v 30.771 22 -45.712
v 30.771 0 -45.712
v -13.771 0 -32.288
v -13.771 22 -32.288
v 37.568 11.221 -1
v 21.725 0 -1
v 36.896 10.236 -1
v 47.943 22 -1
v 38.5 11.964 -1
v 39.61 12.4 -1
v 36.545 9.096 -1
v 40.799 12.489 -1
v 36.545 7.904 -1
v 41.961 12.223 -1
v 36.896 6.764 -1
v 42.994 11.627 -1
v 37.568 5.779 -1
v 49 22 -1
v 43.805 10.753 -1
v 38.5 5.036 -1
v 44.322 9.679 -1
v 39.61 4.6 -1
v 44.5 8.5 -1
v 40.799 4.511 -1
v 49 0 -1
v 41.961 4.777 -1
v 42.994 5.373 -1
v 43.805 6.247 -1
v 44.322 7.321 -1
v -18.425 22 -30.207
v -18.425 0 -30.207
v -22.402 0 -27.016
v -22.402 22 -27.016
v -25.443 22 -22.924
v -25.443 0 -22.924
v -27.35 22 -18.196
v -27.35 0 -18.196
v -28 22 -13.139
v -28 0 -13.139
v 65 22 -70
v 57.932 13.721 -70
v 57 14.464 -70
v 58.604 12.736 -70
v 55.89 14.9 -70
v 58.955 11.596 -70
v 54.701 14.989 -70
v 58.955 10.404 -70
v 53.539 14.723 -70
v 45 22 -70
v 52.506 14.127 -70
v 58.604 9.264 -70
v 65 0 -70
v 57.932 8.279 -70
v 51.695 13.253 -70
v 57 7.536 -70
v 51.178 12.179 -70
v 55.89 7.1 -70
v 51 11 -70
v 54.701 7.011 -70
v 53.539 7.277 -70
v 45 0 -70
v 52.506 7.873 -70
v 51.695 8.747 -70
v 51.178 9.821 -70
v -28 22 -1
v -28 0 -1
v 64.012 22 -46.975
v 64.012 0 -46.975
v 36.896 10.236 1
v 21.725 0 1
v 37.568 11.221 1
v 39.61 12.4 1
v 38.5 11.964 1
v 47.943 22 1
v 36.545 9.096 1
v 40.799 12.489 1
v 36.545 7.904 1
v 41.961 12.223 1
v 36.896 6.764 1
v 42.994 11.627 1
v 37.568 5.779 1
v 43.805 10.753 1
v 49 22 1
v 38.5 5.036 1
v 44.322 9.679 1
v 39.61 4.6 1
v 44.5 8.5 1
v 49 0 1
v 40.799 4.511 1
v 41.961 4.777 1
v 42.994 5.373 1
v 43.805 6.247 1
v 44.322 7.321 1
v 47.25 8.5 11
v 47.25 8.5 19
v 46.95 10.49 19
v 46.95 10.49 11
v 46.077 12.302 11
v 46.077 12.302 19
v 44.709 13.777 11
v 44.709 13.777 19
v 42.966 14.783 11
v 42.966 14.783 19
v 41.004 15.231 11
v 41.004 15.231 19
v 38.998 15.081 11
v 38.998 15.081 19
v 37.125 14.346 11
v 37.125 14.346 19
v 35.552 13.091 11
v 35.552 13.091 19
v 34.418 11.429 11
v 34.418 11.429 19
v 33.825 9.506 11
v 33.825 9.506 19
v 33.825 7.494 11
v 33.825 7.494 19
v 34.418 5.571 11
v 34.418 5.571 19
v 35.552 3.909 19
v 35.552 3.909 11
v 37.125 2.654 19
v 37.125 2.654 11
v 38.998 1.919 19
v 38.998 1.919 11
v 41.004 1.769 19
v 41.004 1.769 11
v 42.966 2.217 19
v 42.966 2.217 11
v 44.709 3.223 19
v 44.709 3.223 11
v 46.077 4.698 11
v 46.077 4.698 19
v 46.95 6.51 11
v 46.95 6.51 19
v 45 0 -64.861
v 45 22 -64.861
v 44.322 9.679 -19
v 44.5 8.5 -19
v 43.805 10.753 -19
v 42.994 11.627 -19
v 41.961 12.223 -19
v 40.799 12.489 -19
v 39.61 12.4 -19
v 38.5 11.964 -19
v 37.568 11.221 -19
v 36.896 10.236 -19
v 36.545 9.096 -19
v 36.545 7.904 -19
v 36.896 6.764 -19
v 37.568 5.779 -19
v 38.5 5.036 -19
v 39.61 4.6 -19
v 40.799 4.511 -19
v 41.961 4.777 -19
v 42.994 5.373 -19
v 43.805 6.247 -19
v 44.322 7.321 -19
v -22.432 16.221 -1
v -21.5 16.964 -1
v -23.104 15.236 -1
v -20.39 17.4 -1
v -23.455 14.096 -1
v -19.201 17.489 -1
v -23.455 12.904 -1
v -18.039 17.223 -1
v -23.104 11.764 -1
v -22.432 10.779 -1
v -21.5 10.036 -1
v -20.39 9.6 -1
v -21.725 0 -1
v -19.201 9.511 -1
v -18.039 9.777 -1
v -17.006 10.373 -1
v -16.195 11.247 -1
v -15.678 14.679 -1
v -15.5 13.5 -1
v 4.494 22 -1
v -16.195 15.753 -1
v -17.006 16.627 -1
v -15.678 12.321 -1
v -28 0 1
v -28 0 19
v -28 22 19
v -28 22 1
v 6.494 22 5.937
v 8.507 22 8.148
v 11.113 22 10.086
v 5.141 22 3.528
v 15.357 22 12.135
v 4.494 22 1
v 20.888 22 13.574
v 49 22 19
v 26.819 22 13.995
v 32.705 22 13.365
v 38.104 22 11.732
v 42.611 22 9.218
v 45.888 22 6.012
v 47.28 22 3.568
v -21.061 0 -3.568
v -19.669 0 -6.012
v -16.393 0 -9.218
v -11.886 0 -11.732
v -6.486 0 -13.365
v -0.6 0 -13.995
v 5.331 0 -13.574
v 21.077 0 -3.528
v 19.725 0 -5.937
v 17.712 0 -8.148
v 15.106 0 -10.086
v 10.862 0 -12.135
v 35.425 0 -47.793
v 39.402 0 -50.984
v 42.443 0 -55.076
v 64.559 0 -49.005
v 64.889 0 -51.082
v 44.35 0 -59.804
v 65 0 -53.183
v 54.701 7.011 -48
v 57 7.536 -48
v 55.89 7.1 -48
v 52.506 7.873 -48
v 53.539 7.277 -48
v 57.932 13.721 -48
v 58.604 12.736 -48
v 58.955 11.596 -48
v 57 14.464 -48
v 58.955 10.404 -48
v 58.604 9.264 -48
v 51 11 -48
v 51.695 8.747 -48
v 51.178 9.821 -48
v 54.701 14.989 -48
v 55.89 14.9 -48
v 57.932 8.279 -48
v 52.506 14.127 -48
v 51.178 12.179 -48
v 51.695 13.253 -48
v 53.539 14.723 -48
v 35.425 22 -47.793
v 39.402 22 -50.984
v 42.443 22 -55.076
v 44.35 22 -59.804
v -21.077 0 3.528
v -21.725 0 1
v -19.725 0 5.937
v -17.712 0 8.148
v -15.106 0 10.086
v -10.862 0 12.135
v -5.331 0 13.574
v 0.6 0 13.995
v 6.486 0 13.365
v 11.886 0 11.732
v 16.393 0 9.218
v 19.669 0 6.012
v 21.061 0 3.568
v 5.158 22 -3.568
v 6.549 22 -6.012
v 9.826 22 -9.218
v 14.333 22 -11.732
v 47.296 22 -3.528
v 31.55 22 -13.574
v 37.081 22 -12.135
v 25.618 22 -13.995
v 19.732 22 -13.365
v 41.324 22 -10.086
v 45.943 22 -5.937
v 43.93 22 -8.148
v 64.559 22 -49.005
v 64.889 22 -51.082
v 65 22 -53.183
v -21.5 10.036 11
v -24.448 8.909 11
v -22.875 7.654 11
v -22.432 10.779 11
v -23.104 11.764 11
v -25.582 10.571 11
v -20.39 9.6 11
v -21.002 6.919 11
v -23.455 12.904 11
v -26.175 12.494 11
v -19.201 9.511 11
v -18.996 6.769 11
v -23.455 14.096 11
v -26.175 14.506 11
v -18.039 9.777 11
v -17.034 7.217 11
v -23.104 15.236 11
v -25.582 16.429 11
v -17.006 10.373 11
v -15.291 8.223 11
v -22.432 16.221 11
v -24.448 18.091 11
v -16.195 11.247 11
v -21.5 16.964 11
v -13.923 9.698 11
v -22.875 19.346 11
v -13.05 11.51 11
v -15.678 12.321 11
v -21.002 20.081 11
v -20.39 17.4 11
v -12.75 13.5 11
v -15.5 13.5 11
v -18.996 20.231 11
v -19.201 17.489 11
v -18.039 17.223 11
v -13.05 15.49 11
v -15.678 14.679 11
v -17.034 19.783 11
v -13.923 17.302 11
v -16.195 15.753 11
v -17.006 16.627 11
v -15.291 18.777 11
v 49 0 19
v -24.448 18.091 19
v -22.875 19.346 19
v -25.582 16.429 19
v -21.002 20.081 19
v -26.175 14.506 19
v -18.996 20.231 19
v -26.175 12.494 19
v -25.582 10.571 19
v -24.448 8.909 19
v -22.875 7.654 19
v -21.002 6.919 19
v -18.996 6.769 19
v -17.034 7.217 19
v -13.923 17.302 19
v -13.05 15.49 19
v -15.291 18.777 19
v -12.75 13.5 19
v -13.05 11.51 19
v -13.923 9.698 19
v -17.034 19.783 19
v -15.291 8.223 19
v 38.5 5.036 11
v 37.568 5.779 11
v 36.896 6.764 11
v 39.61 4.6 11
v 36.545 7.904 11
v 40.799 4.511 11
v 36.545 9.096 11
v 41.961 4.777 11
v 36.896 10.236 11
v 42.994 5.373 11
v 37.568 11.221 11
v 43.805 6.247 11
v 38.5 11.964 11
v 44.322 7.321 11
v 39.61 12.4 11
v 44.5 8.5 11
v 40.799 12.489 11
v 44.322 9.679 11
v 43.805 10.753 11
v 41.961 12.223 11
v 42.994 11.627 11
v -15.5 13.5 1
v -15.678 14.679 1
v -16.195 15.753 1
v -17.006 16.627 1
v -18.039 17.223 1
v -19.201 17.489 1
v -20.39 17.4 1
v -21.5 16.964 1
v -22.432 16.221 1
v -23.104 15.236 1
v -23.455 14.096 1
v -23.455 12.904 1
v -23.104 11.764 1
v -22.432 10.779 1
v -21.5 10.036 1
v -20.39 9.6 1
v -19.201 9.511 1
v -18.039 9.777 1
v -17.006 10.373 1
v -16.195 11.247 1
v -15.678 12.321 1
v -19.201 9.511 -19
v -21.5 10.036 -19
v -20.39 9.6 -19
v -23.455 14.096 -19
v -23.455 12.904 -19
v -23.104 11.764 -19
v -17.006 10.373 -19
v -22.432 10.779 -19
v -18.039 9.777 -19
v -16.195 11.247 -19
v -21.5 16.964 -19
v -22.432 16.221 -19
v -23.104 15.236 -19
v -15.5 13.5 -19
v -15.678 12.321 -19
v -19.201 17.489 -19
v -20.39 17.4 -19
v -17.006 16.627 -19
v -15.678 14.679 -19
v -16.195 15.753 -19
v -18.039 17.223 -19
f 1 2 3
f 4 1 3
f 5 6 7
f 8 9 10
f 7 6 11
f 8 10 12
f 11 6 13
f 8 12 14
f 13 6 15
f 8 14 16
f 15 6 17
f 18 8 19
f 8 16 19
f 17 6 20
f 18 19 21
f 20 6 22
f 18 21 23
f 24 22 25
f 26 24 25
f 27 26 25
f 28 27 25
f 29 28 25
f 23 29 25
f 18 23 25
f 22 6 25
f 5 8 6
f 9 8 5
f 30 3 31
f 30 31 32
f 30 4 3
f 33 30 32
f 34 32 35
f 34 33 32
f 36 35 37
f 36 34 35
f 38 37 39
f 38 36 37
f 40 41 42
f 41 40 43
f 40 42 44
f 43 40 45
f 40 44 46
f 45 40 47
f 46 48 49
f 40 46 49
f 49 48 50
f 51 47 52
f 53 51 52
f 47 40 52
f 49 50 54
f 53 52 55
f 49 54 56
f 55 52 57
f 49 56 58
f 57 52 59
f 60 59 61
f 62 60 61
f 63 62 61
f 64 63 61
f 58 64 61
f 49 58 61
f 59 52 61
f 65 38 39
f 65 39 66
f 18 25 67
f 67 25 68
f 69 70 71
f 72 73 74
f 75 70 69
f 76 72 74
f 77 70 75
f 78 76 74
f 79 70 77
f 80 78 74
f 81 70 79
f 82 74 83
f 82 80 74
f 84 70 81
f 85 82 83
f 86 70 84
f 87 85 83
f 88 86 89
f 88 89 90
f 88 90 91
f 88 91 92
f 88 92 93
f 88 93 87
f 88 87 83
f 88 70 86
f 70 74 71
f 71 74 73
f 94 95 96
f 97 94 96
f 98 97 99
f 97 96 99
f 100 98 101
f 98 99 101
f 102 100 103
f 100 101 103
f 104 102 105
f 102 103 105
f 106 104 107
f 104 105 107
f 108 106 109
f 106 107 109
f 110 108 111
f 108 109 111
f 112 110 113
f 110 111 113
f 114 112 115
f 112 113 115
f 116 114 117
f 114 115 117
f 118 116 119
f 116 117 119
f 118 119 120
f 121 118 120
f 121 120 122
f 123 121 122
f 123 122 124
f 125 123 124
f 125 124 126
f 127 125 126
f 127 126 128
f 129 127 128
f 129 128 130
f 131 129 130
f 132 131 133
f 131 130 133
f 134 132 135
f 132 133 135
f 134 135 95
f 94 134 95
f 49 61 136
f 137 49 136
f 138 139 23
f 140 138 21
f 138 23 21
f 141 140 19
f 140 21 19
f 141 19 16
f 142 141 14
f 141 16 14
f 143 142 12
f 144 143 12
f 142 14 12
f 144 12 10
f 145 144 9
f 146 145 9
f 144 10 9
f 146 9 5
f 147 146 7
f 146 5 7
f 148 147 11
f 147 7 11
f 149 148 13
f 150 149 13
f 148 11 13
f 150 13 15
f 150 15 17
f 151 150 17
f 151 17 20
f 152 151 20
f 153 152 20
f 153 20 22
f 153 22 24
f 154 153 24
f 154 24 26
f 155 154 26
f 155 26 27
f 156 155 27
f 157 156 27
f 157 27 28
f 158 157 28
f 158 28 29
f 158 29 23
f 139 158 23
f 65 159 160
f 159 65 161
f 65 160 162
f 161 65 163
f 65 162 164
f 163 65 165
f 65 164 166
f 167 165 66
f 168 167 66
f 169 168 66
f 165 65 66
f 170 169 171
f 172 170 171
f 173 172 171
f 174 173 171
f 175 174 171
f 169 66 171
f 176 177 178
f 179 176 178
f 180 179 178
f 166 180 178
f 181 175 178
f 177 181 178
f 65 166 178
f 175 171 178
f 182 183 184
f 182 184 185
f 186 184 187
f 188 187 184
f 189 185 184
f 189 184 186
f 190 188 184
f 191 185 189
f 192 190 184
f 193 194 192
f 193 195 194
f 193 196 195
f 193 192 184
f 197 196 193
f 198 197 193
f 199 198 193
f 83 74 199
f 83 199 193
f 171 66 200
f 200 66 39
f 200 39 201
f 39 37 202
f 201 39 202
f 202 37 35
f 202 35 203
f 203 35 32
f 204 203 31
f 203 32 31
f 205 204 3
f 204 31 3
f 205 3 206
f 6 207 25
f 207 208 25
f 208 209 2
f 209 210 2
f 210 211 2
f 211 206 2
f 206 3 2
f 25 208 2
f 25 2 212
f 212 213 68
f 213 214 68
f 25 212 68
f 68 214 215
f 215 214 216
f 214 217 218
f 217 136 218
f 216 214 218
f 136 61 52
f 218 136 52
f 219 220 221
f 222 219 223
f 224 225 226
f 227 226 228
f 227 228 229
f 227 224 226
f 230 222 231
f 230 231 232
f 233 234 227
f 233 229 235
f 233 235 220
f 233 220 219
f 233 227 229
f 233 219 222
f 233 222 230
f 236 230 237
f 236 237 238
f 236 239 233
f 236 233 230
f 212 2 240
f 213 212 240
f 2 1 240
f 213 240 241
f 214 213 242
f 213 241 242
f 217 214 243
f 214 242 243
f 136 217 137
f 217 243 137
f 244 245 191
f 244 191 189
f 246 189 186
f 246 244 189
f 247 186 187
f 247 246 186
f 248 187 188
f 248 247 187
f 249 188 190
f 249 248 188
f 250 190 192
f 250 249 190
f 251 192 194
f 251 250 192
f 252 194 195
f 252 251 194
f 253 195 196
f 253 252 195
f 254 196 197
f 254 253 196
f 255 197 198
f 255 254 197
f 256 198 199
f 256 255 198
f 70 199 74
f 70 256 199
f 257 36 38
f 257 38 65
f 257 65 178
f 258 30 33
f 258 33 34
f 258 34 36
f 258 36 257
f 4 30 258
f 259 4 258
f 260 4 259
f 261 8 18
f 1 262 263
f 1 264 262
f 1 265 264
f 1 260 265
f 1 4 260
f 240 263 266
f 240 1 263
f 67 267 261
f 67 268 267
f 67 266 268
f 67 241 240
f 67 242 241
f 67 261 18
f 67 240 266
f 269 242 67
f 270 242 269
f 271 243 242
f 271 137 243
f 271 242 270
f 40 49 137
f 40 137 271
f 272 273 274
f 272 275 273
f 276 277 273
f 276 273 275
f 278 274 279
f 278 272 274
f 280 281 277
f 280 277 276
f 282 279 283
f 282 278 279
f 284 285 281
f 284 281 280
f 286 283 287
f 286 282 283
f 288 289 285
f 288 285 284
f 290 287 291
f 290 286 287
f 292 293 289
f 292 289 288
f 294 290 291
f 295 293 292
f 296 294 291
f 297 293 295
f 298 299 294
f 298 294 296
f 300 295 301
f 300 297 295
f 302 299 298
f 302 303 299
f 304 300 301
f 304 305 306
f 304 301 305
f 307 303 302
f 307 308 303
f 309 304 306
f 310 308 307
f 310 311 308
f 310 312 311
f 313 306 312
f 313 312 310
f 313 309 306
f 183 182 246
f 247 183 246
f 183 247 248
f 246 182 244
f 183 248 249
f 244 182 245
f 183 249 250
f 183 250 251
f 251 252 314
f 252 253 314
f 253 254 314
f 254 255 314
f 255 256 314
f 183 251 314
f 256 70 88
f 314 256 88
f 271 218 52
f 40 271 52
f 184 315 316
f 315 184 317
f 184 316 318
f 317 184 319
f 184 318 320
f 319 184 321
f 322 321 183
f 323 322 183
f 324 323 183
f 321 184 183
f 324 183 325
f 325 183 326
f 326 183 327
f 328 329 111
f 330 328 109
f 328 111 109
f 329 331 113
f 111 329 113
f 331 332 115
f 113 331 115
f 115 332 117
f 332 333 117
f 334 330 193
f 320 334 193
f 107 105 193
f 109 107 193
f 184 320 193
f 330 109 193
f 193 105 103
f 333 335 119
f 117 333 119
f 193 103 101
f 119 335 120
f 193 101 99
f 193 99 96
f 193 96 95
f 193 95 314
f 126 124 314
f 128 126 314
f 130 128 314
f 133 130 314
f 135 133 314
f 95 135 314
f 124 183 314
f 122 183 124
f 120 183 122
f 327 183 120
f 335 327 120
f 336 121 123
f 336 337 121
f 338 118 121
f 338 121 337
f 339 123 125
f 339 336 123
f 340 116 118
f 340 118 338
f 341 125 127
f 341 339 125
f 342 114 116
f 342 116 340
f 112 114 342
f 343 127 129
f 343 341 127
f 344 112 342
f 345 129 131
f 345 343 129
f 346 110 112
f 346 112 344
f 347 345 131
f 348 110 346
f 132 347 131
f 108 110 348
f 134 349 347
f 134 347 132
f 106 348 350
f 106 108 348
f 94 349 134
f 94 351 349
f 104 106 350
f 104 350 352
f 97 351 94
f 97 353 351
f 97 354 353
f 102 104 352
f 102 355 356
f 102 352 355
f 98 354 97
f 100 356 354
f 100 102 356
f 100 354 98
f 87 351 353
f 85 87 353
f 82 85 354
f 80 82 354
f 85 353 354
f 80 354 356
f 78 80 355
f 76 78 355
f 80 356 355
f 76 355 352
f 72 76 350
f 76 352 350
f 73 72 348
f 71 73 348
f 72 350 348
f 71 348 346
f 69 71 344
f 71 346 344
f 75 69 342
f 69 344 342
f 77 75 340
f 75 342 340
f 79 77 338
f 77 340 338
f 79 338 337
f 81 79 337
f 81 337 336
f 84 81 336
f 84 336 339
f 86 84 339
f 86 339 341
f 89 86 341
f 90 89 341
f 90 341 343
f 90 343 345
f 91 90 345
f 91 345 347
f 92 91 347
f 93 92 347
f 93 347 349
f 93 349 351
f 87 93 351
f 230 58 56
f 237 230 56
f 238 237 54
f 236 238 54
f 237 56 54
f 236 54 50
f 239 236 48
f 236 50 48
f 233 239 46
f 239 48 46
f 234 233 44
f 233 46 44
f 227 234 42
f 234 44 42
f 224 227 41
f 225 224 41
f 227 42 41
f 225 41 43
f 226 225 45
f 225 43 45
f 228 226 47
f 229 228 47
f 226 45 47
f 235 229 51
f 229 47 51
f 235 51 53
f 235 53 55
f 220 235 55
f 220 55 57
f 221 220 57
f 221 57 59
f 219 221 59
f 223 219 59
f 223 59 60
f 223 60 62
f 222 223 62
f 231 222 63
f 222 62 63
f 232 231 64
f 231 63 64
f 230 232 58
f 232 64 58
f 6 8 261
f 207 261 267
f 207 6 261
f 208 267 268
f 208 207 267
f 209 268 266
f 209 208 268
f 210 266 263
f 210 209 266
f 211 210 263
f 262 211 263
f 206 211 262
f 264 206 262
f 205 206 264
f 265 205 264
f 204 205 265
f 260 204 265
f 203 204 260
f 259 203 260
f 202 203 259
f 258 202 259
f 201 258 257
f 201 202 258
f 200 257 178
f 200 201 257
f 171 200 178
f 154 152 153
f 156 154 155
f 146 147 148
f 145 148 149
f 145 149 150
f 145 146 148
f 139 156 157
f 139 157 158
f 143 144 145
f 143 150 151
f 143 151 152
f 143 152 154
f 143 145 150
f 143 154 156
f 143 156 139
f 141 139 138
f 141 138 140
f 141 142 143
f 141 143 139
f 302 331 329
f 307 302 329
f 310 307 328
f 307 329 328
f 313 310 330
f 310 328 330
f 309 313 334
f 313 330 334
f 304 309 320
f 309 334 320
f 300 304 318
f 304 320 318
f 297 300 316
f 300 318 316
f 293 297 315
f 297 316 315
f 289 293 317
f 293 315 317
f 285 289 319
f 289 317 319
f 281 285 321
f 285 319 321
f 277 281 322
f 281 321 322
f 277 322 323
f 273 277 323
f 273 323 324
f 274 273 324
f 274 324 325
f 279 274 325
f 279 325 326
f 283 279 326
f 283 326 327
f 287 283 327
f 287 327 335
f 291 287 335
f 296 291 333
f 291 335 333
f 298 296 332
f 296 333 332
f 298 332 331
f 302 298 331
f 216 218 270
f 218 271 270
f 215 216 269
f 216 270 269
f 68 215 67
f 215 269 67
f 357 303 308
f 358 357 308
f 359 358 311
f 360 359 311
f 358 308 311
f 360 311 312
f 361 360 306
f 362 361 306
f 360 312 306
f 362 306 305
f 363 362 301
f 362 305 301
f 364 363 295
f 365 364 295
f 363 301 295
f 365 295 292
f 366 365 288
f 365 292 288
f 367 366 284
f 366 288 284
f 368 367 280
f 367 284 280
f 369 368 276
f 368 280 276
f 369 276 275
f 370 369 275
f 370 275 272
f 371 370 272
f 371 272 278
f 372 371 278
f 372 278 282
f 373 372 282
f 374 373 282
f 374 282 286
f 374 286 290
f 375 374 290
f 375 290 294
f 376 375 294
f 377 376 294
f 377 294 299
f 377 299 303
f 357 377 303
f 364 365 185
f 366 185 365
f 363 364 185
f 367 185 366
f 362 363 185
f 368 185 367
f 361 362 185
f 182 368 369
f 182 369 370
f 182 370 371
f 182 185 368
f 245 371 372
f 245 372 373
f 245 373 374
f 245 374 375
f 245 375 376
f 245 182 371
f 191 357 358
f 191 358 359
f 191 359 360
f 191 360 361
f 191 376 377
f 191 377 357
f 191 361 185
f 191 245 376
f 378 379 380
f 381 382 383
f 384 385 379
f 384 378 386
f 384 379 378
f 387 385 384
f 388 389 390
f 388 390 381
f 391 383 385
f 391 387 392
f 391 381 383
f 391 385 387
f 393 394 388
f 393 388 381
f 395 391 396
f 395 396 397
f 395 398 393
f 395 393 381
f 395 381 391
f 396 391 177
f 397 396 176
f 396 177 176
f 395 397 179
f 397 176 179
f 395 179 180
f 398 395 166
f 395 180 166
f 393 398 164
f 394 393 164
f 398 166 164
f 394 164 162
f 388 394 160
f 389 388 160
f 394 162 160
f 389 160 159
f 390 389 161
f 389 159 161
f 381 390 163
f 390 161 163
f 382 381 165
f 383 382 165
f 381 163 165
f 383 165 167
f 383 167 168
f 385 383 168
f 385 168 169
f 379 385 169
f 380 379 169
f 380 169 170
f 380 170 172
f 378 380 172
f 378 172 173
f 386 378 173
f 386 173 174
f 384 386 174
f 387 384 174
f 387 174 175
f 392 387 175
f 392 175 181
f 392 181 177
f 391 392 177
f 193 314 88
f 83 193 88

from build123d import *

# Parameters (mm, degrees)
BOSS_EXTRU_1_DEPTH      = 22
ESQUISSE1_W             = 77
ESQUISSE1_H             = 18
BOSS_EXTRU_1_2_DEPTH    = 22
ESQUISSE4_R             = 4
ENL_V_MAT_EXTRU_1_DEPTH = 22
CONG_1_R                = 20
CONG_2_R                = 20
ESQUISSE8_R             = 6.75
ENL_V_MAT_EXTRU_2_DEPTH = 8
ESQUISSE9_R             = 4
ENL_V_MAT_EXTRU_3_DEPTH = 30
CONG_3_R                = 20


with BuildPart() as part:
    # Esquisse1 → Boss.-Extru.1 (new body)
    with BuildSketch(Plane(origin=(0, 0, 0), x_dir=(1, 0, 0), z_dir=(0, 1, 0))):
        Polygon((-28, 1), (49, 1), (65, 50), (65, 70), (45, 70), (45, 50), (-28, 28), align=None)
    extrude(amount=BOSS_EXTRU_1_DEPTH)


with BuildPart() as body_2:
    # Esquisse1 → Boss.-Extru.1 2 (new body)
    with BuildSketch(Plane(origin=(0, 0, 0), x_dir=(1, 0, 0), z_dir=(0, 1, 0))):
        with Locations((10.5, -10)):
            Rectangle(ESQUISSE1_W, ESQUISSE1_H)
    extrude(amount=BOSS_EXTRU_1_2_DEPTH)


with BuildPart() as enl_vement_de_mati_re_r_volution1_tool:
    # Esquisse3 → Enlèvement de matière-Révolution1 (revolve)
    with BuildSketch(Plane.XY):
        Polygon((-42.132444372, -35.353318533), (42.132444372, 35.353318533), (33.133417836, 46.077940736), (-51.131470907, -24.628696329), align=None)
    revolve(axis=Axis((-42.132444372, -35.353318533, 0), (0.766044443, 0.64278761, 0)))


with BuildPart() as part_1:
    add(part.part)

    # Enlèvement de matière-Révolution1: cut by enl_vement_de_mati_re_r_volution1_tool
    add(enl_vement_de_mati_re_r_volution1_tool.part, mode=Mode.SUBTRACT)

    # Esquisse4 → Enlèv. mat.-Extru.1 (cut)
    with BuildSketch(Plane(origin=(0, 0, -70), x_dir=(-1, 0, 0), z_dir=(0, 0, -1))):
        with Locations((-55, 11)):
            Circle(ESQUISSE4_R)
    extrude(amount=-ENL_V_MAT_EXTRU_1_DEPTH, mode=Mode.SUBTRACT)

    # Congé1
    cong_1_edges = [part_1.edges().sort_by_distance(p)[0] for p in [
        (45, 11, -50),
    ]]
    fillet(cong_1_edges, radius=CONG_1_R)

    # Congé2
    cong_2_edges = [part_1.edges().sort_by_distance(p)[0] for p in [
        (65, 11, -50),
    ]]
    fillet(cong_2_edges, radius=CONG_2_R)


with BuildPart() as body_2_1:
    add(body_2.part)

    # Enlèvement de matière-Révolution1: cut by enl_vement_de_mati_re_r_volution1_tool
    add(enl_vement_de_mati_re_r_volution1_tool.part, mode=Mode.SUBTRACT)

    # Esquisse8 → Enlèv. mat.-Extru.2 (cut)
    with BuildSketch(Plane.XY.offset(19)):
        with Locations((40.5, 8.5)):
            Circle(ESQUISSE8_R)
        with Locations((-19.5, 13.5)):
            Circle(ESQUISSE8_R)
    extrude(amount=-ENL_V_MAT_EXTRU_2_DEPTH, mode=Mode.SUBTRACT)


with BuildPart() as enl_v_mat_extru_3_tool:
    # Esquisse9 → Enlèv. mat.-Extru.3 (new body)
    with BuildSketch(Plane.XY.offset(11)):
        with Locations((-19.5, 13.5)):
            Circle(ESQUISSE9_R)
        with Locations((40.5, 8.5)):
            Circle(ESQUISSE9_R)
    extrude(amount=-ENL_V_MAT_EXTRU_3_DEPTH)


with BuildPart() as part_2:
    add(part_1.part)

    # Enlèv. mat.-Extru.3: cut by enl_v_mat_extru_3_tool
    add(enl_v_mat_extru_3_tool.part, mode=Mode.SUBTRACT)

    # Congé3
    cong_3_edges = [part_2.edges().sort_by_distance(p)[0] for p in [
        (-28, 11, -28),
    ]]
    fillet(cong_3_edges, radius=CONG_3_R)


with BuildPart() as body_2_2:
    add(body_2_1.part)

    # Enlèv. mat.-Extru.3: cut by enl_v_mat_extru_3_tool
    add(enl_v_mat_extru_3_tool.part, mode=Mode.SUBTRACT)


solid = Compound([part_2.part, body_2_2.part])
